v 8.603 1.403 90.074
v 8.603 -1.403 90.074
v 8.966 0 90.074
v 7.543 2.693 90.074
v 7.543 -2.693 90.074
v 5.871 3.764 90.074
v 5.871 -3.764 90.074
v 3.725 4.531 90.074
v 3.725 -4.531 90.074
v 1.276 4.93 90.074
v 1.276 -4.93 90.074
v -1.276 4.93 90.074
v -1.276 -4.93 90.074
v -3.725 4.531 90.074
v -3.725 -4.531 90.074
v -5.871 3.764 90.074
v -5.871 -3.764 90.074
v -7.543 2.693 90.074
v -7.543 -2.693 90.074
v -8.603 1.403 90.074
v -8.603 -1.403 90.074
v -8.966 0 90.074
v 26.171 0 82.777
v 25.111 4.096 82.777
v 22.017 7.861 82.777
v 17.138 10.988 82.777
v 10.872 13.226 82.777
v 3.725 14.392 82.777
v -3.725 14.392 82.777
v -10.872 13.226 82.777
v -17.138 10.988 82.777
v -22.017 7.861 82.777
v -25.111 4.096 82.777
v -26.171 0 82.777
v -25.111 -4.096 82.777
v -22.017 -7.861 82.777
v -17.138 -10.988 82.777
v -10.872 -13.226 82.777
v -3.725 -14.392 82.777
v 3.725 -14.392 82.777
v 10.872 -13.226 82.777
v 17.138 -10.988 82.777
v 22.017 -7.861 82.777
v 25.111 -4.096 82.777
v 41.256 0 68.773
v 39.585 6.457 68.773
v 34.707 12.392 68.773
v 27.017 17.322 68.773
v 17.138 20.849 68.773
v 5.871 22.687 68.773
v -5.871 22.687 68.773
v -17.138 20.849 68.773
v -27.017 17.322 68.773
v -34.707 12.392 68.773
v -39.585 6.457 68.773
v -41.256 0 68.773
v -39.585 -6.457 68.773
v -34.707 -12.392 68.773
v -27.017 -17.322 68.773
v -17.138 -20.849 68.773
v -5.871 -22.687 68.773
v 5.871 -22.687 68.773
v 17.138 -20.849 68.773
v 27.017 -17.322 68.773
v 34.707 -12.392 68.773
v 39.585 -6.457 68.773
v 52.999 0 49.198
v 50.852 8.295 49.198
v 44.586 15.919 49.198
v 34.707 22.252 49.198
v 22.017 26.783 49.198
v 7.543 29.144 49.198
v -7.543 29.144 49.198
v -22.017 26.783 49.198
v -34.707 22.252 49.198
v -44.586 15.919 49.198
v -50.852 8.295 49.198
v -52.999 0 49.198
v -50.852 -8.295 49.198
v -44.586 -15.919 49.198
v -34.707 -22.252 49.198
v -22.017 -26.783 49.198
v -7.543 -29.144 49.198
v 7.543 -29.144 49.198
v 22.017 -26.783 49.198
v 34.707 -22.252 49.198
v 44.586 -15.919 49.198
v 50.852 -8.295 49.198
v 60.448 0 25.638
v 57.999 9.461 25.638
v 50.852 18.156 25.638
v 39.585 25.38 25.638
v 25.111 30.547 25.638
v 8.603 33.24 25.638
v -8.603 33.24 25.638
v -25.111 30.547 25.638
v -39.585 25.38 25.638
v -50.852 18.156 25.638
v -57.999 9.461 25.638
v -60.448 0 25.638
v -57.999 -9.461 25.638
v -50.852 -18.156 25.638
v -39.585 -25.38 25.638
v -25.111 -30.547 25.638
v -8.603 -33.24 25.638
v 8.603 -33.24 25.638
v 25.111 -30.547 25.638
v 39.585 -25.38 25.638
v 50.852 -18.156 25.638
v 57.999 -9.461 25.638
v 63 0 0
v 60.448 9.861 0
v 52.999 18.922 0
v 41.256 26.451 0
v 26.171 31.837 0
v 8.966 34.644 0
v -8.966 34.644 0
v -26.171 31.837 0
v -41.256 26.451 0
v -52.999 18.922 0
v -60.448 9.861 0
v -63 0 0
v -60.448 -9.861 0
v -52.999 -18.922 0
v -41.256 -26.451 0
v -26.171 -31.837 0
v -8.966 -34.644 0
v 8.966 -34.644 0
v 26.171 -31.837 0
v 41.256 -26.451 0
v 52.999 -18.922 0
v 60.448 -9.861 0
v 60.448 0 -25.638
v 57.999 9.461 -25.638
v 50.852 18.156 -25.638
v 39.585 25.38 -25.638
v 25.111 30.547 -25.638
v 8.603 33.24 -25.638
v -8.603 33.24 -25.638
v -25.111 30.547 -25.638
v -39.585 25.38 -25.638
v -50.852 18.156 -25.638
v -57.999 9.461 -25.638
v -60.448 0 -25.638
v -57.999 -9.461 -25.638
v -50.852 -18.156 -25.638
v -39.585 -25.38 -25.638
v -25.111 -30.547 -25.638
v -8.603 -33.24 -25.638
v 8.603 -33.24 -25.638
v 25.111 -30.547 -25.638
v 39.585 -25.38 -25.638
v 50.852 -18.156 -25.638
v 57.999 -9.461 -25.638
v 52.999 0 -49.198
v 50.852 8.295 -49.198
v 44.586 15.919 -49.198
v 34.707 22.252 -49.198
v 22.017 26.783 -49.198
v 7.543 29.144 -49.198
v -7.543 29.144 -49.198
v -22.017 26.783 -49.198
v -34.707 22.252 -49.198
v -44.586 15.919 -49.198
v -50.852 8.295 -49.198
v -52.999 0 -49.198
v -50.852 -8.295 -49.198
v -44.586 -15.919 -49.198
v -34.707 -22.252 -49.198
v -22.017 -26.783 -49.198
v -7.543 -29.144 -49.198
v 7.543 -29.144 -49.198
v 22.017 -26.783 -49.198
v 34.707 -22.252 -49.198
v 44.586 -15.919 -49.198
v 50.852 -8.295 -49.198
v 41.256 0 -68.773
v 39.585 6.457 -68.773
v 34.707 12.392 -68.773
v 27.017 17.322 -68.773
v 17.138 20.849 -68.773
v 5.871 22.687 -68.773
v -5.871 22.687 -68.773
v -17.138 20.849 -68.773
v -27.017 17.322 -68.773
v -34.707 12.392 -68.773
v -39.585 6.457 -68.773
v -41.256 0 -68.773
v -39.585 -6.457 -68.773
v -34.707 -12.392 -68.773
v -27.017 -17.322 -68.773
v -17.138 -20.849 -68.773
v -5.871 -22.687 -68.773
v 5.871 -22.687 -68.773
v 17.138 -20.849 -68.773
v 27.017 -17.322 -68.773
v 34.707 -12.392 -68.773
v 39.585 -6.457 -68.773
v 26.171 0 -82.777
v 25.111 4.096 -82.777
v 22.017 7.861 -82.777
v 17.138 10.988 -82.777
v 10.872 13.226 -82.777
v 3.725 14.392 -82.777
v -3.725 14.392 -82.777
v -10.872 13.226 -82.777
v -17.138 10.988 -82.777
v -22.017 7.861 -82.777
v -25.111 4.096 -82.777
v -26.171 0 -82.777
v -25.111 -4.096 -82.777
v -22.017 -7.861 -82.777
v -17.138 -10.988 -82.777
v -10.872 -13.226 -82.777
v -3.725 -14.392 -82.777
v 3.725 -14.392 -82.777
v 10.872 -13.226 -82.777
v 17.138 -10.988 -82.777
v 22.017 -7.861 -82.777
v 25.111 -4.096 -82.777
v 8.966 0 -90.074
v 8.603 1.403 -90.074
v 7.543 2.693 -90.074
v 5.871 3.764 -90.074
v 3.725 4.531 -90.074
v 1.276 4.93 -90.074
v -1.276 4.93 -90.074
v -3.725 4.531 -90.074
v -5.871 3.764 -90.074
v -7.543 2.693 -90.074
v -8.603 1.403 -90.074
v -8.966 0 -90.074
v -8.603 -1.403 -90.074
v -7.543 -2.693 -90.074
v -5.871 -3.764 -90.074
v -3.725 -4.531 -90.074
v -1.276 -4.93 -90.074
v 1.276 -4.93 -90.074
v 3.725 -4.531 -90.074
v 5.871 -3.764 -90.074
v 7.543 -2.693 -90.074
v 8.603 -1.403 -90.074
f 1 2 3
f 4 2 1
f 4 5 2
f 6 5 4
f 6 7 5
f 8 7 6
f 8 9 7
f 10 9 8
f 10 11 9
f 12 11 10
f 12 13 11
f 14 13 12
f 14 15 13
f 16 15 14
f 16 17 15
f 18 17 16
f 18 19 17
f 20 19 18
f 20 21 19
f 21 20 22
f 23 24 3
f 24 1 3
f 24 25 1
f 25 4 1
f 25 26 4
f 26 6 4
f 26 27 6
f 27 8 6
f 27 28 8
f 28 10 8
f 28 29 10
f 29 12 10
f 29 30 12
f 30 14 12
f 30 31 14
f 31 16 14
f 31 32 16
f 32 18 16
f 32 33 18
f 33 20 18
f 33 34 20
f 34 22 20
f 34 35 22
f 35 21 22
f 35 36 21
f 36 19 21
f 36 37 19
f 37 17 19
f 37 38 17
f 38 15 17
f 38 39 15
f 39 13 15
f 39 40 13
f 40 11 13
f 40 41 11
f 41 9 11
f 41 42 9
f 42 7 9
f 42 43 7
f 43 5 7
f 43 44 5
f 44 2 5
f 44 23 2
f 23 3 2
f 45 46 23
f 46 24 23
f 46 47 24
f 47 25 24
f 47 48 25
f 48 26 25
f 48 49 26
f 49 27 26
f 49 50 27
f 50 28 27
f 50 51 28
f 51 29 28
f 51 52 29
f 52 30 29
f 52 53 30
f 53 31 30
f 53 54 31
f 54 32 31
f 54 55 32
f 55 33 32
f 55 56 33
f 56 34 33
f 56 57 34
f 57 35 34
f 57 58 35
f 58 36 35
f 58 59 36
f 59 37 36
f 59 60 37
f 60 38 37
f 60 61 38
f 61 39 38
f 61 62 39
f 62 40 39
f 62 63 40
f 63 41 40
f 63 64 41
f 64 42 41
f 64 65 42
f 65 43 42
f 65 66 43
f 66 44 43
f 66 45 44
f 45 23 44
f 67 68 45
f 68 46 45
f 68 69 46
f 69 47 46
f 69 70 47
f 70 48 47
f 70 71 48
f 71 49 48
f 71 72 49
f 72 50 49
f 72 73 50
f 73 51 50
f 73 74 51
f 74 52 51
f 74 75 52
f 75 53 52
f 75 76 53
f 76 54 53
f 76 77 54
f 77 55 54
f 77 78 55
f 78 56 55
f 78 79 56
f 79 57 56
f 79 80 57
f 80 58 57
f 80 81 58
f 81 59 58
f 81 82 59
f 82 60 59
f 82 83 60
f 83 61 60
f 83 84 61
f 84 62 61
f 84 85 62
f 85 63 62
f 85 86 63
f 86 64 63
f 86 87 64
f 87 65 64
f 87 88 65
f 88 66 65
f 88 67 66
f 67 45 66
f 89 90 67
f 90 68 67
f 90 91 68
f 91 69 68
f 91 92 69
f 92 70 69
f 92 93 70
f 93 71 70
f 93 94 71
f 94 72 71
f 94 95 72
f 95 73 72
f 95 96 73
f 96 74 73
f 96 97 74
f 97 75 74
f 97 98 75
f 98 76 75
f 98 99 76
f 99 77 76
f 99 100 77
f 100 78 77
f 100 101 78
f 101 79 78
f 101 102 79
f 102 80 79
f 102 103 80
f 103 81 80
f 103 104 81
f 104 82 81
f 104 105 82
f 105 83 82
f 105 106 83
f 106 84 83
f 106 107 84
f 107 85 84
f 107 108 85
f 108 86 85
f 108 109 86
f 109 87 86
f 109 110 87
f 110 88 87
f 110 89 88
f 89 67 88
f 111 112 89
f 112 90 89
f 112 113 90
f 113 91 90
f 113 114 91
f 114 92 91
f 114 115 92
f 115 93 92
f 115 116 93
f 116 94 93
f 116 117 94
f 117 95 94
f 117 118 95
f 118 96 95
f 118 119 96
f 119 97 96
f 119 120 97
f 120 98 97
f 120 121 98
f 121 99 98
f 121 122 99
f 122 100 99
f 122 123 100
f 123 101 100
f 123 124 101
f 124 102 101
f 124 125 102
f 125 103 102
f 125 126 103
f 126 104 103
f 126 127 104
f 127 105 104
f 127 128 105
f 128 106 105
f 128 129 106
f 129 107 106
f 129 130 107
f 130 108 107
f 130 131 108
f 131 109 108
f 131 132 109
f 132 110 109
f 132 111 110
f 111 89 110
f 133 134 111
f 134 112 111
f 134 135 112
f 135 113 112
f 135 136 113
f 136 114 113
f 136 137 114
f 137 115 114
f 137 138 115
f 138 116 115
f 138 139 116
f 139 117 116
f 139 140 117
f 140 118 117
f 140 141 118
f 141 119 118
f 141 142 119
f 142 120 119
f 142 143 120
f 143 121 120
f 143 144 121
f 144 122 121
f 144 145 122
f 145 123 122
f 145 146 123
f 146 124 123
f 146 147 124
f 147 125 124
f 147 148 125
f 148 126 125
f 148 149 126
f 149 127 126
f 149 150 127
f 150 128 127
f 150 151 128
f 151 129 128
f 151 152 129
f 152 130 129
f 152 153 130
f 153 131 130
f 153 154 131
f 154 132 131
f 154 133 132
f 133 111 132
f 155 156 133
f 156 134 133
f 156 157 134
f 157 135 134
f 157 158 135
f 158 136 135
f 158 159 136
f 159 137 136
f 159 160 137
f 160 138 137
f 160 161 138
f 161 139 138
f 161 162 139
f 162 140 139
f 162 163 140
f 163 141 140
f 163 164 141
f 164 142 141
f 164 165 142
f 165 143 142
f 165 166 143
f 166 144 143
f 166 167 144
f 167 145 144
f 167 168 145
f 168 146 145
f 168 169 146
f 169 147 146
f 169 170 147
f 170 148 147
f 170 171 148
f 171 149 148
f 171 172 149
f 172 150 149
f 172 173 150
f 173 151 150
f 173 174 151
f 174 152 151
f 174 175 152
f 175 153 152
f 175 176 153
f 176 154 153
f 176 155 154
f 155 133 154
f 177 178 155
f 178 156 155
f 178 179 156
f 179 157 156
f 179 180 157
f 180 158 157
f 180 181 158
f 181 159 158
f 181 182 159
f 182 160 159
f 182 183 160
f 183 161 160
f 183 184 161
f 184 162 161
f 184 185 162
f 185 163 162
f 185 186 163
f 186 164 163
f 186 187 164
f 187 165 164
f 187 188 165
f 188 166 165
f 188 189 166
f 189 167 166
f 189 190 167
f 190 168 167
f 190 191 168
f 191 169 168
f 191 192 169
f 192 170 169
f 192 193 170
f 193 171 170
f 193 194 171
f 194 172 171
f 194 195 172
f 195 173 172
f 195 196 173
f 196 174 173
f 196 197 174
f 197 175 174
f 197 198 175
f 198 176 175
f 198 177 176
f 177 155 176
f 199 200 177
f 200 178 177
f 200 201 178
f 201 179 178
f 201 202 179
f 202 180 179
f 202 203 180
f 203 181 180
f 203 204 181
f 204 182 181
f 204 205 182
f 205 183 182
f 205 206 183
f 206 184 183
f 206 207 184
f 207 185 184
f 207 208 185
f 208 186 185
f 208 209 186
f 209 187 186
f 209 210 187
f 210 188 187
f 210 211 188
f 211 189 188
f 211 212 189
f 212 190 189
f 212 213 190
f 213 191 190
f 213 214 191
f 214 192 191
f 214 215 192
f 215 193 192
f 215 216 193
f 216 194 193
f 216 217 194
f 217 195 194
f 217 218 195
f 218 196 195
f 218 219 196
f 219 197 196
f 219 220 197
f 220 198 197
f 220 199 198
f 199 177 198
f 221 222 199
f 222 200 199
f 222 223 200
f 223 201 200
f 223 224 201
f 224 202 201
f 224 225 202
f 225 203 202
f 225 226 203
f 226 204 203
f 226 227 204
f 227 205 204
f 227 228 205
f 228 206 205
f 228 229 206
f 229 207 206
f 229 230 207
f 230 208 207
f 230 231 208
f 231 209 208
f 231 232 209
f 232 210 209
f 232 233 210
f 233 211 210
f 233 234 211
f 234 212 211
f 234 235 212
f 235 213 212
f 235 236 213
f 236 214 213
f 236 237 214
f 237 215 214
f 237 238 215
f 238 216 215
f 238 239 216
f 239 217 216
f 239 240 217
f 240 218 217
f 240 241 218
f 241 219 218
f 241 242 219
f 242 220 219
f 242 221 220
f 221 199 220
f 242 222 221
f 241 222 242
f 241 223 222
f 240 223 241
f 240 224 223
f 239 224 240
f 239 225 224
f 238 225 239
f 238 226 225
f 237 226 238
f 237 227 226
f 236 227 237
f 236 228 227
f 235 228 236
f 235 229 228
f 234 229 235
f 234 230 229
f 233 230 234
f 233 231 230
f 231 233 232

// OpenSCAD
// Generated by SolidPython 1.0.1 on 2020-07-29 00:46:48


scale(v = [9, 5, 13]) {
	sphere(r = 7);
}
/***********************************************
*********      SolidPython code:      **********
************************************************
 
# import packages: SolidPython
from solid import *
from solid.utils import *
from itertools import chain, combinations, permutations


class Resize:

    def __init__(self, scad_file):
        self.scad_file = scad_file
        #self.scad_file = import_scad(scad_file)
        # cone/cylinder param:
        self.r1 = 0
        self.r2 = 0
        self.h = 0
        # rectangular prism param:
        self.w = 0
        self.l = 0
        # ellipse param:
        self.r = 0

    # import OpenScad code (file name corresponds to shape)


    # classify shape + parameters
    def assign(self, param1, param2, param3):
        if self.scad_file == 'cone.scad':
            self.r1 = param1
            self.r2 = param2
            self.h = param3
        elif self.scad_file == 'cylinder.scad':
            self.r1 = param1
            self.r2 = param2
            self.h = param3
        elif self.scad_file == 'rectangularPrism.scad':
            self.h = param1
            self.l = param2
            self.w = param3
        else:
            self.r = param1
            self.h = param2

    # resize parameters
    def iterate(self):
        x = range(3, 20, 2)
        i = 1
        if self.scad_file == 'cone.scad':
            tempList = list(permutations(x, 2))
            for temp in tempList:
                param1 = temp[0]
                param2 = temp[1]
                filepath = 'produced_scad_files/' + 'cone' + str(param1) + '_' + str(param2) + '_' + '.scad'
                scad_render_to_file(cylinder(h=param1, r1=param2, r2=0), filepath)

        elif self.scad_file == 'cylinder.scad':
            tempList = list(permutations(x, 3))
            for temp in tempList:
                param1 = temp[0]
                param2 = temp[1]
                filepath = 'produced_scad_files/' + 'cylinder' + str(param1) + '_' + str(param2) + '_' + '.scad'
                scad_render_to_file(cylinder(h=param1, r1=param2, r2=param2), filepath)

        elif self.scad_file == 'rectangularPrism.scad':
            tempList = list(permutations(x, 3))
            for temp in tempList:
                param1 = temp[0]
                param2 = temp[1]
                param3 = temp[2]
                filepath = 'produced_scad_files/' + 'rectangularPrism' + str(param1) + '_' + str(param2) + '_' + str(
                    param3) + '.scad'
                scad_render_to_file(cube(size=(param1, param2, param3)), filepath)

        elif self.scad_file == 'ellipse.scad':
            tempList = list(permutations(x, 4))
            for temp in tempList:
                param1 = temp[0]
                param2 = temp[1]
                param3 = temp[2]
                param4 = temp[3]
                filepath = 'produced_scad_files/' + 'ellipse' + str(param1) + '_' + str(param2) + '_' + str(param3) + '_' + str(param4) + '.scad'
                scad_render_to_file(scale([param1, param2, param3])(sphere(r=param4)), filepath)

    def render_to_scadfile(self):
        scad_render_to_file(scad, 'example.scad') 
 
************************************************/
